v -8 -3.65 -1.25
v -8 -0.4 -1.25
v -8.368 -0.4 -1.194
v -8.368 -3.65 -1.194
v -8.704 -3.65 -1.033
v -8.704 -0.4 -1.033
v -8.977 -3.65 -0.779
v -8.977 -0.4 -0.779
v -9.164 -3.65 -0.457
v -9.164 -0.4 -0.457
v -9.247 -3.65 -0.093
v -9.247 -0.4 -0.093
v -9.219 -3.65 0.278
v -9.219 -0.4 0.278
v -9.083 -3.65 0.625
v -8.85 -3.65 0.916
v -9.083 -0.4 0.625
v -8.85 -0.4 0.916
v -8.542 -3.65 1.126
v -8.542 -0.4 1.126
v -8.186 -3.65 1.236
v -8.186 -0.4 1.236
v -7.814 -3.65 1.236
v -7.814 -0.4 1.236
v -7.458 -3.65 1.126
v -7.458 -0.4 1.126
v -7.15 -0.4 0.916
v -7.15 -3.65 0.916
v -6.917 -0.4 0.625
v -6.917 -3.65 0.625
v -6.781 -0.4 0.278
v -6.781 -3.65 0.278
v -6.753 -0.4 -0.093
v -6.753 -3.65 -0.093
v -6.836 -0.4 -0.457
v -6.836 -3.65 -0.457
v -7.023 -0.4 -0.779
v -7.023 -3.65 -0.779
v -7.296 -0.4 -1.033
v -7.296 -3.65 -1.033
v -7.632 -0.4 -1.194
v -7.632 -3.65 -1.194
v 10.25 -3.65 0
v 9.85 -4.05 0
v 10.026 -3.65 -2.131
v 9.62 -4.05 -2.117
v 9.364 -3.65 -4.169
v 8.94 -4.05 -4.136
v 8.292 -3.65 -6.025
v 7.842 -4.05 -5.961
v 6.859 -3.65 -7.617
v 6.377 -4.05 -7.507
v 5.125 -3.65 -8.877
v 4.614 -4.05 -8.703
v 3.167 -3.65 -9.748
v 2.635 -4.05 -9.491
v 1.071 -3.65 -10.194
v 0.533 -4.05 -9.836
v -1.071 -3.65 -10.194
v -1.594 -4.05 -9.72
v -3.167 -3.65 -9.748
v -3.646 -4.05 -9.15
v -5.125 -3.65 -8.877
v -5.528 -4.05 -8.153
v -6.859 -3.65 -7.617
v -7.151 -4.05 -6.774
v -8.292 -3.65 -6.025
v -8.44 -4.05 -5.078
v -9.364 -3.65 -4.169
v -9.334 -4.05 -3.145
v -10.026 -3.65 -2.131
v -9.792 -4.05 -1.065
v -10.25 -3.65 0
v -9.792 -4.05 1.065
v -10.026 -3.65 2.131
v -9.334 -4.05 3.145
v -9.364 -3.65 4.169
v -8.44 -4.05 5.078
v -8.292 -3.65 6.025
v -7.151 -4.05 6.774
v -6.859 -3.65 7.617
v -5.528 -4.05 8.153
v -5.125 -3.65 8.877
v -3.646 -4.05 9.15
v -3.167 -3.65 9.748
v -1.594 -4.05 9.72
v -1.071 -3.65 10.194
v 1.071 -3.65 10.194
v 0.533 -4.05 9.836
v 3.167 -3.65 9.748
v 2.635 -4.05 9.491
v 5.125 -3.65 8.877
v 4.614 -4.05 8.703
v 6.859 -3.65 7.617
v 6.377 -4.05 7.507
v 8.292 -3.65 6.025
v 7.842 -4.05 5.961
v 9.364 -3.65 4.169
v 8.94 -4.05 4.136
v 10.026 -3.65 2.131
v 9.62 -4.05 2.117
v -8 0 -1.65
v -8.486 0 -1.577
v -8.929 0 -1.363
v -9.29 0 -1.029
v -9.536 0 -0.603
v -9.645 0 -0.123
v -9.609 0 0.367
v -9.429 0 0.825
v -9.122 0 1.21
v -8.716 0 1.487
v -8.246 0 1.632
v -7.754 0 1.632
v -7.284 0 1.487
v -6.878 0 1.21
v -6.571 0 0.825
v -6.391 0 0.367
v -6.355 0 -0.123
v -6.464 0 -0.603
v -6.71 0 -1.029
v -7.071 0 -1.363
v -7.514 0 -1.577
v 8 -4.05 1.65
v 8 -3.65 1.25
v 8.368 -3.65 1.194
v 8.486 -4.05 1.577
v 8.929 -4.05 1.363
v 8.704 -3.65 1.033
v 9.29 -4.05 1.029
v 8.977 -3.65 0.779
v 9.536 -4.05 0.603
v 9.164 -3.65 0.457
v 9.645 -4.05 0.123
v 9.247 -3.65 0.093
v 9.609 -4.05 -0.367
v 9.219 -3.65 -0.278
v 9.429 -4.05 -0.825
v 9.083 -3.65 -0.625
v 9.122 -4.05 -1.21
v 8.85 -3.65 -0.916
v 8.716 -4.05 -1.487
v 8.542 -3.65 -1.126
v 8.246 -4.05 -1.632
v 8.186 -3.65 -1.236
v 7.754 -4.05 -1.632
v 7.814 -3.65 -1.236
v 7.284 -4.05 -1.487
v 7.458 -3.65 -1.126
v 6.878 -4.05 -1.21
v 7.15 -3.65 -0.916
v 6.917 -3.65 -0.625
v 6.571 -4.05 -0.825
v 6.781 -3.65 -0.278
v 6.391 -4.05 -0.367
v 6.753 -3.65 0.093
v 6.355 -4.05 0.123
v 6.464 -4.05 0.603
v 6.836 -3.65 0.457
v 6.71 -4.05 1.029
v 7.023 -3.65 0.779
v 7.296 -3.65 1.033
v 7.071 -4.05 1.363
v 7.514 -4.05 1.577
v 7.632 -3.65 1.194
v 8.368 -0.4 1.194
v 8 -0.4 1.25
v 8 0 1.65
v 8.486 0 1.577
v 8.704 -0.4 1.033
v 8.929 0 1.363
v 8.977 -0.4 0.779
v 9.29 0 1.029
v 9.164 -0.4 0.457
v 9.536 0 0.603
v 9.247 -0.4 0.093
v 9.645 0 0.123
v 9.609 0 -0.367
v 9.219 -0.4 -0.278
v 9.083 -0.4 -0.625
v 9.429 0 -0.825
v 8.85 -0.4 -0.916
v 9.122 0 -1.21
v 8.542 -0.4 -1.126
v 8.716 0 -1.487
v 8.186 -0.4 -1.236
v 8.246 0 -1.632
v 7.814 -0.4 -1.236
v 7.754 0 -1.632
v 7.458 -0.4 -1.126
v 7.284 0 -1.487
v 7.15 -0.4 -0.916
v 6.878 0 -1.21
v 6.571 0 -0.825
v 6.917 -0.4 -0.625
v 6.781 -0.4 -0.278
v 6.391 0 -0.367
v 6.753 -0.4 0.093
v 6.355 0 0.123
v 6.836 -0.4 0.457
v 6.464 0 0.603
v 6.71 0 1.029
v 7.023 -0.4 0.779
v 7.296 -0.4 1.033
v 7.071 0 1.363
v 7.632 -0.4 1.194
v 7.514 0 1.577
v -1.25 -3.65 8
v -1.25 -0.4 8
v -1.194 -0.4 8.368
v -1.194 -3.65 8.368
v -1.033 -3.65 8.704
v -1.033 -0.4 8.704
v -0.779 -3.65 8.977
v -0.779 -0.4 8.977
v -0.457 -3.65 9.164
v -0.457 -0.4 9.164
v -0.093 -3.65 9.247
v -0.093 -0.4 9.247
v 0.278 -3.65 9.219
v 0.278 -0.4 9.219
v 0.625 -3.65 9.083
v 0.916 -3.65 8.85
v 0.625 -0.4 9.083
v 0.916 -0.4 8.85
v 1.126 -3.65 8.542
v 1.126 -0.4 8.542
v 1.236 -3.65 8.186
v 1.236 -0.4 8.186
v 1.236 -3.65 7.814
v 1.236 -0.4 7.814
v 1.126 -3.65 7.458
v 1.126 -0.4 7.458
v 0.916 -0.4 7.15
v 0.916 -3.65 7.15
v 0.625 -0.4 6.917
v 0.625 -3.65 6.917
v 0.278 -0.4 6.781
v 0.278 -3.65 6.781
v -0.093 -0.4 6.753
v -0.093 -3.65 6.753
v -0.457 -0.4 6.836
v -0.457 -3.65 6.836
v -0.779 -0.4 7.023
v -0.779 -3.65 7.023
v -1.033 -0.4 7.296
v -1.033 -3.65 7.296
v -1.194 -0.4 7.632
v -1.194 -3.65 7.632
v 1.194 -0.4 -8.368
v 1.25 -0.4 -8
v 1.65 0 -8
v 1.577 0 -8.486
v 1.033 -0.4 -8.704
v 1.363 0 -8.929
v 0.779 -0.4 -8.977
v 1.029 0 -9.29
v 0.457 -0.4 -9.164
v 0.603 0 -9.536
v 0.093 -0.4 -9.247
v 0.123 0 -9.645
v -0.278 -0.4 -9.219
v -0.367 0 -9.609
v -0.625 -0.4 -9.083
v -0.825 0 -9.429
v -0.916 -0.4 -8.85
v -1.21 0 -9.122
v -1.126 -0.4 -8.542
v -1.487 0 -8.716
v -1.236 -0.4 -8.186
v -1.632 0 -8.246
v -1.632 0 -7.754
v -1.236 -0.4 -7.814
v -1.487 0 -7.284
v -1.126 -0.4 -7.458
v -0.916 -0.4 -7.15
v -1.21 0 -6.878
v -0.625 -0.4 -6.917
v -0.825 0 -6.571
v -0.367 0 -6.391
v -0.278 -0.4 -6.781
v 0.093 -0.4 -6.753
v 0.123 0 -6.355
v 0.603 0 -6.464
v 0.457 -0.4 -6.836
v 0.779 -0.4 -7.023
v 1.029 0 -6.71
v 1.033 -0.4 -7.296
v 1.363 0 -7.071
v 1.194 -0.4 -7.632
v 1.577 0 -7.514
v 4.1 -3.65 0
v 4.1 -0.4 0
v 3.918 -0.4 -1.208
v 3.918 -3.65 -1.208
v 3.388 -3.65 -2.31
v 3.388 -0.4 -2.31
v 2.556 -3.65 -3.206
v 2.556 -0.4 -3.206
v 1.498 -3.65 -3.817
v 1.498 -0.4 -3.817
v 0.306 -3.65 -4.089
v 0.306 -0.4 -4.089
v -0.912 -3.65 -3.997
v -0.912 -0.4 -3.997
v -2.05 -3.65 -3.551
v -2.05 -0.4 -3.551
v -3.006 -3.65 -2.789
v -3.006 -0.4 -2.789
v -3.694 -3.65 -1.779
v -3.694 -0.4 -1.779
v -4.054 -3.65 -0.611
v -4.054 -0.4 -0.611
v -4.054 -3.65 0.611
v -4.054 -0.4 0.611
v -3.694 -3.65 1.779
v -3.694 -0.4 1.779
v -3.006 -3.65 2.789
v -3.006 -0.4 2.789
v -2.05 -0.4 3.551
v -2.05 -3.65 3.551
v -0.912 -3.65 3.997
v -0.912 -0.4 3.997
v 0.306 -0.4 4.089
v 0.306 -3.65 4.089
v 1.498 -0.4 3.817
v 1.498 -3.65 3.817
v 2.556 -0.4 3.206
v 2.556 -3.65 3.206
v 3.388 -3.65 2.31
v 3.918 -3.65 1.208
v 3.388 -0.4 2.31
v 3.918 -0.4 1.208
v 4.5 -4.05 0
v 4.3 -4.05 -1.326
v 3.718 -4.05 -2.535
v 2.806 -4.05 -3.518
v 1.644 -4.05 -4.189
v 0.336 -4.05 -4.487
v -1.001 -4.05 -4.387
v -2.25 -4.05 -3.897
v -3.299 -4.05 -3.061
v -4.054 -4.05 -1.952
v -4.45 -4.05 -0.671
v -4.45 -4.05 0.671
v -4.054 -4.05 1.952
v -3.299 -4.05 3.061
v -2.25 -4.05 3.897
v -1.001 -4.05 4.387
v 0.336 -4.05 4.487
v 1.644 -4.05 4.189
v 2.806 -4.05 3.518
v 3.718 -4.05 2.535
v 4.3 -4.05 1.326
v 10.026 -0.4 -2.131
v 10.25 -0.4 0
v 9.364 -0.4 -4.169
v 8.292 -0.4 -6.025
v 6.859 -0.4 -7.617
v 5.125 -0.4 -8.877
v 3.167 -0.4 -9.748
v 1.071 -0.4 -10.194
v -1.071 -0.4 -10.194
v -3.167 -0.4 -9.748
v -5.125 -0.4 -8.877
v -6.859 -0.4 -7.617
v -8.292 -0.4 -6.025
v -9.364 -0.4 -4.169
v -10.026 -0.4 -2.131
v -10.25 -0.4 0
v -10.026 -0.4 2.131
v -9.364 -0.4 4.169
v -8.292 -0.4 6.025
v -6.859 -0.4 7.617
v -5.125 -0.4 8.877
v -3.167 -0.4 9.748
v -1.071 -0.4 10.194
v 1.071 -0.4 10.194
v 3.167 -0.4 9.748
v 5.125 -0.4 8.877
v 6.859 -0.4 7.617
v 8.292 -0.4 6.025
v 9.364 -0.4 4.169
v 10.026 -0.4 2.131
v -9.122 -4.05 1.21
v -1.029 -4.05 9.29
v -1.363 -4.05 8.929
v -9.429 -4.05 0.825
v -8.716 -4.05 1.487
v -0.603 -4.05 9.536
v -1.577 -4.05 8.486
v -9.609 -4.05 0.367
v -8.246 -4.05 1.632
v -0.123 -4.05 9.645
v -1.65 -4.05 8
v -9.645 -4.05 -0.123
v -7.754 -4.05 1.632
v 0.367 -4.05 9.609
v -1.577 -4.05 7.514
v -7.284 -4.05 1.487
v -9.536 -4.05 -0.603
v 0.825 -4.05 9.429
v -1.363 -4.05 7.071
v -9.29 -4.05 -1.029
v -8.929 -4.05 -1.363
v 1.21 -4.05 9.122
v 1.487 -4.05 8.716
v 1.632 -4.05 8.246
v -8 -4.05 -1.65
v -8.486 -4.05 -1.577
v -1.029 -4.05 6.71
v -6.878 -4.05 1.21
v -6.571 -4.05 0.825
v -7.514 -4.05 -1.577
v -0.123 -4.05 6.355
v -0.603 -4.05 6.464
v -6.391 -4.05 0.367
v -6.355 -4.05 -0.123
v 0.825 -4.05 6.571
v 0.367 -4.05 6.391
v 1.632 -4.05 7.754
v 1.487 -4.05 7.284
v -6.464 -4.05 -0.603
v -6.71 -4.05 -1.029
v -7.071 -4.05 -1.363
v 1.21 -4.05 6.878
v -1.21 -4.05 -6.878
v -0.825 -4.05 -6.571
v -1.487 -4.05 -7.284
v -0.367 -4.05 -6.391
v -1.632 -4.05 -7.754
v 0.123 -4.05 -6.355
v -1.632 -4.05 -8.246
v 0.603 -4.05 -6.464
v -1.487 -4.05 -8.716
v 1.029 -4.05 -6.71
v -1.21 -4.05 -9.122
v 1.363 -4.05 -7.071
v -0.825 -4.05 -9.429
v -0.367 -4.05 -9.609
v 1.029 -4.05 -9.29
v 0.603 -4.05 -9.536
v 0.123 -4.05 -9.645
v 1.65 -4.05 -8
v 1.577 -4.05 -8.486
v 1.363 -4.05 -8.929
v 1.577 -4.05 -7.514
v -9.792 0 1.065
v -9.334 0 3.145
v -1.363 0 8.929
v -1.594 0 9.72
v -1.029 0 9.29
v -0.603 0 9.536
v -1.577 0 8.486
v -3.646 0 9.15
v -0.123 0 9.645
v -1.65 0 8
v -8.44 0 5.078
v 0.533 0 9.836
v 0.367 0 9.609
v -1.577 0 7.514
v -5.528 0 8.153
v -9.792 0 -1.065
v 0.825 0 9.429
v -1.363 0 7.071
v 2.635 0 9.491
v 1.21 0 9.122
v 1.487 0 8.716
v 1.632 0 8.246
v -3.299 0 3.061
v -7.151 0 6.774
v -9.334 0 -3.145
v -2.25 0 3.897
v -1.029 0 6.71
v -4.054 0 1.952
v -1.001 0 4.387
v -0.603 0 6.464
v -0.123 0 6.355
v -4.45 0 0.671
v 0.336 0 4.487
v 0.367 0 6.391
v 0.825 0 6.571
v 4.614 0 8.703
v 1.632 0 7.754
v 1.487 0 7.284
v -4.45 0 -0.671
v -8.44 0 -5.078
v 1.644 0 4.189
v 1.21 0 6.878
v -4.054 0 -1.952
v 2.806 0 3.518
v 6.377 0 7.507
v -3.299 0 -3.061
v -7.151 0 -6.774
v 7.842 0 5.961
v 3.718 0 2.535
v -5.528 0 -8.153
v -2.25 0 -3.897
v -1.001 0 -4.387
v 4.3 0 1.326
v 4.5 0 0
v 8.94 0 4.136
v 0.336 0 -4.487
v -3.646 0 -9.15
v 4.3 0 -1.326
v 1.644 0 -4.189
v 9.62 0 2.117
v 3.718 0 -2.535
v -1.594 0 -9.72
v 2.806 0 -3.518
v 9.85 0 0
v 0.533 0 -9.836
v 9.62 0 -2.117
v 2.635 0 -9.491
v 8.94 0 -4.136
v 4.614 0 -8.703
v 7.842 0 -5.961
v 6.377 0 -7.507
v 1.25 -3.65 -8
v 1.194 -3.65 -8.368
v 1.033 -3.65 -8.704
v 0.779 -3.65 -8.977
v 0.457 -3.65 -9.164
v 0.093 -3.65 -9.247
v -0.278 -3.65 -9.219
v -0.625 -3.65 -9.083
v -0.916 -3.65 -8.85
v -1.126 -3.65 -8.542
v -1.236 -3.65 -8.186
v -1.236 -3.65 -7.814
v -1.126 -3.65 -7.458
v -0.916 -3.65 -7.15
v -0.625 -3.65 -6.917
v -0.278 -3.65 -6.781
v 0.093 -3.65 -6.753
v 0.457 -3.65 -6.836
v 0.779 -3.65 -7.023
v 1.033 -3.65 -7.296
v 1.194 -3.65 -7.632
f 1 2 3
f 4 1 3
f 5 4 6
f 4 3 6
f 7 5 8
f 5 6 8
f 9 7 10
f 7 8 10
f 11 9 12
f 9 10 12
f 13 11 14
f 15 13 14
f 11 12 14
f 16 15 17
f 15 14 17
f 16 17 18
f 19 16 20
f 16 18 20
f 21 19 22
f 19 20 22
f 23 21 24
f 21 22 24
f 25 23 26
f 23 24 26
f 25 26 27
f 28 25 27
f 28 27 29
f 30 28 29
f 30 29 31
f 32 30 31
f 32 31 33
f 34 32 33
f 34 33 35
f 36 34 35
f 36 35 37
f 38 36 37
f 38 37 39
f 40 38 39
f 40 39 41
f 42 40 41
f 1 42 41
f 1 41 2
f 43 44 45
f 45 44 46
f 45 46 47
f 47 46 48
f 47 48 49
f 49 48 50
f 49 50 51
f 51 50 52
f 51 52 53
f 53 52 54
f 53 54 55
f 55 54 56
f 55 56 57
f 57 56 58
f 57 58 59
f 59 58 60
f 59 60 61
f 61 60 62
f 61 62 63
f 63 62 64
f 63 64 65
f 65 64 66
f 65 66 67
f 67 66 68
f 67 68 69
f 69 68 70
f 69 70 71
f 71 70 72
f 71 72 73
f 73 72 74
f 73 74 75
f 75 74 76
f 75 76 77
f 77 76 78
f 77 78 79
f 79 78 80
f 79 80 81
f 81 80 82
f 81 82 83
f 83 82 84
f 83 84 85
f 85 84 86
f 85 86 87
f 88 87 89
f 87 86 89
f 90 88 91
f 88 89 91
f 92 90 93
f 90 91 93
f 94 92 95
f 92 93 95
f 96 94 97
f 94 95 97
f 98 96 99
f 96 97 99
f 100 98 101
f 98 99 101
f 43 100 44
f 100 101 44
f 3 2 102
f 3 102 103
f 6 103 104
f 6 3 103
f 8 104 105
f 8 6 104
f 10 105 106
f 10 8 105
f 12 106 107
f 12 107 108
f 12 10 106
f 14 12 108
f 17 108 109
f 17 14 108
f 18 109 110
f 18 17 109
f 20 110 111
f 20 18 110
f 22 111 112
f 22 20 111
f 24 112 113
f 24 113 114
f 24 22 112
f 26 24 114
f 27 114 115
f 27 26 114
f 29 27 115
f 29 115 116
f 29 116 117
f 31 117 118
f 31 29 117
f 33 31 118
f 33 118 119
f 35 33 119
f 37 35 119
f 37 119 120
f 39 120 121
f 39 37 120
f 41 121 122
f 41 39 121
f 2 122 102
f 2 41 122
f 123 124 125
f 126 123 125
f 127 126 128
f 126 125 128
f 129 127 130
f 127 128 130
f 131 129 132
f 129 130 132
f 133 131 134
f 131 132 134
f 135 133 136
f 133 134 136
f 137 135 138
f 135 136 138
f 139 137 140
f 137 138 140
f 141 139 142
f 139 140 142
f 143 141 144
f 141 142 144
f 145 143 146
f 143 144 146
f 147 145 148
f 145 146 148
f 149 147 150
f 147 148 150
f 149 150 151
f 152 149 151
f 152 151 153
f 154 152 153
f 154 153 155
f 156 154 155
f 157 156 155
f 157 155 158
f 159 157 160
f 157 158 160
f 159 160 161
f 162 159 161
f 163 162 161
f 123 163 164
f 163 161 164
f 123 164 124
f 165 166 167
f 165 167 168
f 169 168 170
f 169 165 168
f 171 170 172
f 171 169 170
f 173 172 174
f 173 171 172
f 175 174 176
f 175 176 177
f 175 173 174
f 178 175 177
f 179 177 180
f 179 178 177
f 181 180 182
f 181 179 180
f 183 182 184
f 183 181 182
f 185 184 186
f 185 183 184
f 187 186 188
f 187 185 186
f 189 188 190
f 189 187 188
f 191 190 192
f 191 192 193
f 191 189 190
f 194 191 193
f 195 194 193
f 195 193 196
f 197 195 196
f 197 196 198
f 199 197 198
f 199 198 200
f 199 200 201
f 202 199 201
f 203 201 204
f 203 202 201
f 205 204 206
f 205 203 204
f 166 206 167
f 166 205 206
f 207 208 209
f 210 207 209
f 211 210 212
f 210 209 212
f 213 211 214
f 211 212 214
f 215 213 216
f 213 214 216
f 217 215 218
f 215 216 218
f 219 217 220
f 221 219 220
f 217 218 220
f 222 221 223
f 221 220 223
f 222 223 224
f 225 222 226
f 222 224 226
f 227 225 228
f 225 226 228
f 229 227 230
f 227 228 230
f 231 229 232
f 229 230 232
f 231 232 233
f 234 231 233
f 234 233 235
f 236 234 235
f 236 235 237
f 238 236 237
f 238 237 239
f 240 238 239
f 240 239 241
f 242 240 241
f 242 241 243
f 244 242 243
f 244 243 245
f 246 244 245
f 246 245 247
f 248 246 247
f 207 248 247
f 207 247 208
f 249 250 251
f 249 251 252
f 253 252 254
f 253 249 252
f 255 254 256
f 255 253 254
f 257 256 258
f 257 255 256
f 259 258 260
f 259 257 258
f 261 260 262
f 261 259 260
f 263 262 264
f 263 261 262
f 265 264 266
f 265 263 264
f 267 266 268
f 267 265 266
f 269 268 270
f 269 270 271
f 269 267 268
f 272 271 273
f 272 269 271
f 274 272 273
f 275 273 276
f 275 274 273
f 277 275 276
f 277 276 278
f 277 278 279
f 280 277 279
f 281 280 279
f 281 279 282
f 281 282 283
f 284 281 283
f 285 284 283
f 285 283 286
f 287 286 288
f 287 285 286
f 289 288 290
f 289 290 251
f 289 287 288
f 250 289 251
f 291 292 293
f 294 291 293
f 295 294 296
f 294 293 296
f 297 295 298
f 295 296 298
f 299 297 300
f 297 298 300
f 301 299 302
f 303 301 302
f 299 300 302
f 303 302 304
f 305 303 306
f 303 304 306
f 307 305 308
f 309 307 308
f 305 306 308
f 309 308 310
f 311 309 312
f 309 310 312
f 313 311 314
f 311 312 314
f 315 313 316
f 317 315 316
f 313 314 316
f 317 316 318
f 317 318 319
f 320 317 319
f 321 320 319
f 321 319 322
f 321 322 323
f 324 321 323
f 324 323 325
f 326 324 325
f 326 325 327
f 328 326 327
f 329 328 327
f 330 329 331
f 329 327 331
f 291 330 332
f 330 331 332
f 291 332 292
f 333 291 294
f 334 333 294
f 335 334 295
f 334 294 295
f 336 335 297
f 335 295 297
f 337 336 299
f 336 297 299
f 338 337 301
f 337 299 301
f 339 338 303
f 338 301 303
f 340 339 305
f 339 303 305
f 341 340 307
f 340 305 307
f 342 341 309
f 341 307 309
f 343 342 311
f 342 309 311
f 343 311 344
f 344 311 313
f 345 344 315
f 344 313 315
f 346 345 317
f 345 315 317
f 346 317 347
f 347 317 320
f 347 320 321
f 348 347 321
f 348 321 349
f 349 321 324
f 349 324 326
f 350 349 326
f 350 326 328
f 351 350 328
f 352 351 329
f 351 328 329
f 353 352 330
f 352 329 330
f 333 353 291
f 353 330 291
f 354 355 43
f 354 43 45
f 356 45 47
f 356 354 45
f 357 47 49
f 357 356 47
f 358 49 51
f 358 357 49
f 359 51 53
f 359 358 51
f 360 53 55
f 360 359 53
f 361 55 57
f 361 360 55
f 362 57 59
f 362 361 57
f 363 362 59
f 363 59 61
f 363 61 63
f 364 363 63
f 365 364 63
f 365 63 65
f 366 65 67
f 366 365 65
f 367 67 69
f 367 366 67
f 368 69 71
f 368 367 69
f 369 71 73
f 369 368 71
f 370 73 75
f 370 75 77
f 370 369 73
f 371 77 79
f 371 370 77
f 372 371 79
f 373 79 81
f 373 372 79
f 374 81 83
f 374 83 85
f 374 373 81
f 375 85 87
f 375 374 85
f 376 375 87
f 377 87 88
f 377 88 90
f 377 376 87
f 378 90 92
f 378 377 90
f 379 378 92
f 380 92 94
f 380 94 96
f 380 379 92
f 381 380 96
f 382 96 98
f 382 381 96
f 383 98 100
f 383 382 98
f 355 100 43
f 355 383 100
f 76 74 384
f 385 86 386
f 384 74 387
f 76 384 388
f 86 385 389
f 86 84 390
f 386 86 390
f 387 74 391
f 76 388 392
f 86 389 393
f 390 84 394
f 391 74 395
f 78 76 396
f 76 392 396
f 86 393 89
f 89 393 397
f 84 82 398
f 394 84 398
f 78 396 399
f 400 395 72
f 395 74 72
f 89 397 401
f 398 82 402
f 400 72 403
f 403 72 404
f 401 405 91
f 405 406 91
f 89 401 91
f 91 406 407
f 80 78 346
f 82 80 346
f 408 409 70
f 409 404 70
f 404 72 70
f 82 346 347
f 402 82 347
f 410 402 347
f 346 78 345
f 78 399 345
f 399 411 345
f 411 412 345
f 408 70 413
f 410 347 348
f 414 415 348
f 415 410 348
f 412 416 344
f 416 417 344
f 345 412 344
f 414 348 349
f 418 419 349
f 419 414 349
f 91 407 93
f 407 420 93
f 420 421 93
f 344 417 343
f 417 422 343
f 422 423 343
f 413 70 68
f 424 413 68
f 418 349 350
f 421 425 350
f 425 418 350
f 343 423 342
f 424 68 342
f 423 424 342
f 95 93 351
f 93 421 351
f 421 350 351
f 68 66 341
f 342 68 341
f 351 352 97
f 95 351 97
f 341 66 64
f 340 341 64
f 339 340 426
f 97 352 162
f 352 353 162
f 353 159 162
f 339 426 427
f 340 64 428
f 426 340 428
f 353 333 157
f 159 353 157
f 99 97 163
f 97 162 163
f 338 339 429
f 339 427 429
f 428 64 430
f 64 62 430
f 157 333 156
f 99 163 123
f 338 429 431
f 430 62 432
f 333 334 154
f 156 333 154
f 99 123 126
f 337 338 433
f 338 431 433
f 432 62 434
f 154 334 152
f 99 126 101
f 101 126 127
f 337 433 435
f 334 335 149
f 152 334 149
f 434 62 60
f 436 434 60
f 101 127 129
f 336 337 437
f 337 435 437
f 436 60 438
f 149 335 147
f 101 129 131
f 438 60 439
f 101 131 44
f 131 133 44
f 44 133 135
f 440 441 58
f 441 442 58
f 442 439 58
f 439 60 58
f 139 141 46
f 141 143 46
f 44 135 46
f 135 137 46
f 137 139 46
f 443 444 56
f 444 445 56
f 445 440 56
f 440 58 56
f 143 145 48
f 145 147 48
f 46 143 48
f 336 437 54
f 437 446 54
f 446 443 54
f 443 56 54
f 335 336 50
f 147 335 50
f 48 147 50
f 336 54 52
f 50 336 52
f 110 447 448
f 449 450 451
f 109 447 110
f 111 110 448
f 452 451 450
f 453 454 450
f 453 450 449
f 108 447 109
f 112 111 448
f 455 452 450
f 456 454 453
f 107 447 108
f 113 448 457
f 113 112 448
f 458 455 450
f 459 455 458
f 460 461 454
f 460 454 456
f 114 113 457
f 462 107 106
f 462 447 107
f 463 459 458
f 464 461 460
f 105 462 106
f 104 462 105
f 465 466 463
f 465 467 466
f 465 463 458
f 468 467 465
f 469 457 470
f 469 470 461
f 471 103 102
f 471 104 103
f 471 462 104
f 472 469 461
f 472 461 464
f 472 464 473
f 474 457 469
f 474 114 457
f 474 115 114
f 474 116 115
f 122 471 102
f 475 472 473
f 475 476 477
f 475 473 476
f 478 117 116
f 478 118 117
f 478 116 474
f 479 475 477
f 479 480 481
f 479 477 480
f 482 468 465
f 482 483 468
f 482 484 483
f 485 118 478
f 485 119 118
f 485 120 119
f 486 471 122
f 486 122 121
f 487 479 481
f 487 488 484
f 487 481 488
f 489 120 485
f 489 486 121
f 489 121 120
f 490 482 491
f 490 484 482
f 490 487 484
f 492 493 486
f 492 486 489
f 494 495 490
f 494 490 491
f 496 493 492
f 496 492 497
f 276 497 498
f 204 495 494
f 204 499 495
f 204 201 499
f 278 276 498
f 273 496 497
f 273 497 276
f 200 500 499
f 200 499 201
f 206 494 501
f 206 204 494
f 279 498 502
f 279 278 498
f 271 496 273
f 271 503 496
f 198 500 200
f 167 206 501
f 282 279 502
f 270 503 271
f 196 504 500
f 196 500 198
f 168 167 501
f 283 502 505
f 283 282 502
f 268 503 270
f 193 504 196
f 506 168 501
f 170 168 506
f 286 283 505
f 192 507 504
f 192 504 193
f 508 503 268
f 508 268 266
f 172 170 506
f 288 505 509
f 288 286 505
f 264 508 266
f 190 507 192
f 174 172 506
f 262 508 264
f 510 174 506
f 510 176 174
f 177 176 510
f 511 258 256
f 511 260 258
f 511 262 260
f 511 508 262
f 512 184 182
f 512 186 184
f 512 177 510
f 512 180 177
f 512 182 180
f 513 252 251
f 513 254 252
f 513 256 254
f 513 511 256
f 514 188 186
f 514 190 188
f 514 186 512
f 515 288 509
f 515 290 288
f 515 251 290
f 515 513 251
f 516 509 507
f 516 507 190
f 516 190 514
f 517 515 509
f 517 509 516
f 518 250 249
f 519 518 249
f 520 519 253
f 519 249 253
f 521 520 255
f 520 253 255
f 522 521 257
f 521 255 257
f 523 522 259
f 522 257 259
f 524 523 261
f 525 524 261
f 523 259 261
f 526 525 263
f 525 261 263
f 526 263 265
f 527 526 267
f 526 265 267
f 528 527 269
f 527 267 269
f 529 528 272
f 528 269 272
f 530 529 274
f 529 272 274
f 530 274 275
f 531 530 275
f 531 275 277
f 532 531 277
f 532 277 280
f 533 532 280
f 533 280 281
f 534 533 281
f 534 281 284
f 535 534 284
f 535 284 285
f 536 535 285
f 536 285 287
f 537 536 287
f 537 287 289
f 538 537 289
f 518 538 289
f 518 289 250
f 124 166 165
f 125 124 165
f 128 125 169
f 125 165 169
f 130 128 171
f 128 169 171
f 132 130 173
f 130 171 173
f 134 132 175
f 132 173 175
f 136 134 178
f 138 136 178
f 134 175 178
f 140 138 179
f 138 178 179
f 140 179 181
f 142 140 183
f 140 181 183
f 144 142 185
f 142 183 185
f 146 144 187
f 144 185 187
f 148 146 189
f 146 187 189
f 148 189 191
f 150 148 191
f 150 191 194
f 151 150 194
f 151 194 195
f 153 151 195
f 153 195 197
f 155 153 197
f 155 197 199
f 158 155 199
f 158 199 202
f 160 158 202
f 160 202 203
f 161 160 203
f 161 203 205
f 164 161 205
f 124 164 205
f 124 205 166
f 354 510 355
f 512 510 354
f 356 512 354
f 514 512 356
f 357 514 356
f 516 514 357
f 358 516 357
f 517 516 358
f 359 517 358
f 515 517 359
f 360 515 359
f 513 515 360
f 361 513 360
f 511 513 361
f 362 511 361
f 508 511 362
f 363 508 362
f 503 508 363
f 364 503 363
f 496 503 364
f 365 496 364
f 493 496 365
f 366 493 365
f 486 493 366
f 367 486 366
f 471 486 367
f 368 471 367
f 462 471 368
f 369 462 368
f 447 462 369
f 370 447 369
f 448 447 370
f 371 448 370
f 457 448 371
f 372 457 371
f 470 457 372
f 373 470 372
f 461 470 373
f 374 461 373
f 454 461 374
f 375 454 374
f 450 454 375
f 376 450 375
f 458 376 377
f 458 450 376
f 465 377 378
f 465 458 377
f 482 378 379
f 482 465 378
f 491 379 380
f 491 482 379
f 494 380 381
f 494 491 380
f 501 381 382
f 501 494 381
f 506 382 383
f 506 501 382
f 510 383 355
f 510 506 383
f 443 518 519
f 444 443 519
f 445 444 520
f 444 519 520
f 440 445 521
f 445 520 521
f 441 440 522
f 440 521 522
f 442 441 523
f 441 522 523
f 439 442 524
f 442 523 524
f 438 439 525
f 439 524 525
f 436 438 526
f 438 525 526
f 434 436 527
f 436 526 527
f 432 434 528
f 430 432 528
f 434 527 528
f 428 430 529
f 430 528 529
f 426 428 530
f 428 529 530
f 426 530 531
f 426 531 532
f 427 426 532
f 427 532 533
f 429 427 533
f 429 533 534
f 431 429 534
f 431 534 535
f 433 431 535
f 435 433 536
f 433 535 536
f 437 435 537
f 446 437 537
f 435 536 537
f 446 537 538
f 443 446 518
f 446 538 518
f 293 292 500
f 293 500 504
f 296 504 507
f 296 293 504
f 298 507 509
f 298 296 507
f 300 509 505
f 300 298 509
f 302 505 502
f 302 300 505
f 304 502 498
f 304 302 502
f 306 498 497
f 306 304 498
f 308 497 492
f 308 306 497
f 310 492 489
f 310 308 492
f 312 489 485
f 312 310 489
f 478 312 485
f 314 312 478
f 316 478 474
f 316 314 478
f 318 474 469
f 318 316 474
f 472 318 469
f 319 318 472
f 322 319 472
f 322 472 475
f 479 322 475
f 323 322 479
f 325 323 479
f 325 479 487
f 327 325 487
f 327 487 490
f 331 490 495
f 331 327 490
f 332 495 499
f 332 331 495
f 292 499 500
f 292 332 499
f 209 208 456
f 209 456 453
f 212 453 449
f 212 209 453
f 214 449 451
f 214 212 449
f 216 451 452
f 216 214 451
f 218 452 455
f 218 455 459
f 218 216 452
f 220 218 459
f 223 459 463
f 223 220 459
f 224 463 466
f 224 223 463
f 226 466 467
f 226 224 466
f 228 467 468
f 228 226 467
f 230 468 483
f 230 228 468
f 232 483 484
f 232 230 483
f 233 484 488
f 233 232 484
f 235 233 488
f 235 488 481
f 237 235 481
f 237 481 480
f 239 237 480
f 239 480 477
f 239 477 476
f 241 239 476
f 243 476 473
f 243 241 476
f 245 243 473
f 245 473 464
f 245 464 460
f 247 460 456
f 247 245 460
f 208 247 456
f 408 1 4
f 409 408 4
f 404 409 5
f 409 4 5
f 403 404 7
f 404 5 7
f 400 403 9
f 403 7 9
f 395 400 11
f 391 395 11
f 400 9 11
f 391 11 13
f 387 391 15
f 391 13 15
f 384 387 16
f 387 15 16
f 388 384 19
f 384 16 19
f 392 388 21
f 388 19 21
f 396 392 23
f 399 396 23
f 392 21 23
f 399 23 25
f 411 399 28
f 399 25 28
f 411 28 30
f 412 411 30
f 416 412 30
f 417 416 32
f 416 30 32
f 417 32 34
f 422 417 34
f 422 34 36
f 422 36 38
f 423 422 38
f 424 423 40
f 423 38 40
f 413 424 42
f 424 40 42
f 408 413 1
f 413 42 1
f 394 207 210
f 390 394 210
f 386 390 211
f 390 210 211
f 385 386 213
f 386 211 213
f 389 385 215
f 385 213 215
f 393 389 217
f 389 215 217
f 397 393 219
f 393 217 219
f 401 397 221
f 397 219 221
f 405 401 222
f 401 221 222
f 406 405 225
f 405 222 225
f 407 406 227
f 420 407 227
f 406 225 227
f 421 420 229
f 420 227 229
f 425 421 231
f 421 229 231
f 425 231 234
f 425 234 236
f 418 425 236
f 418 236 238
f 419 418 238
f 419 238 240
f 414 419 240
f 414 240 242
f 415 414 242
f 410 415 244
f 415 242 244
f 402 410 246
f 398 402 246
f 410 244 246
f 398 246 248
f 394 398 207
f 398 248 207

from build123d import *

# Parameters (mm, degrees)
SKETCH1_R           = 10.25
SKETCH1_R_2         = 4.1
BOSS_EXTRUDE1_DEPTH = 4.05
SKETCH4_R           = 1.25
CUT_EXTRUDE1_DEPTH  = 5.05
CIRPATTERN1_COUNT   = 4
CHAMFER1_SIZE       = 0.4


with BuildPart() as part:
    # Sketch1 → Boss-Extrude1 (new body)
    with BuildSketch(Plane(origin=(0, 0, 0), x_dir=(1, 0, 0), z_dir=(0, 1, 0))):
        Circle(SKETCH1_R)
        Circle(SKETCH1_R_2, mode=Mode.SUBTRACT)
    extrude(amount=-BOSS_EXTRUDE1_DEPTH)

    # Sketch4 → Cut-Extrude1 (cut, through all)
    with BuildSketch(Plane(origin=(0, 0, 0), x_dir=(1, 0, 0), z_dir=(0, 1, 0))):
        with Locations((0, 8)):
            Circle(SKETCH4_R)
    cut_extrude1 = extrude(amount=-CUT_EXTRUDE1_DEPTH, mode=Mode.SUBTRACT)

    # CirPattern1: Cut-Extrude1 ×4 about axis
    cirpattern1_axis = Axis((0, 0, 0), (0, 1, 0))
    for i in range(1, CIRPATTERN1_COUNT):
        add(cut_extrude1.rotate(cirpattern1_axis, i * 360 / CIRPATTERN1_COUNT), mode=Mode.SUBTRACT)

    # Chamfer1
    chamfer1_edges = [part.edges().sort_by_distance(p)[0] for p in [
        (-1.25, -4.05, -8),
        (-1.25, 0, -8),
        (-10.25, 0, 0),
        (-8, -4.05, 1.25),
        (-8, 0, 1.25),
        (1.25, -4.05, 8),
        (1.25, 0, 8),
        (8, -4.05, -1.25),
        (8, 0, -1.25),
        (-10.25, -4.05, 0),
        (-4.1, -4.05, 0),
        (-4.1, 0, 0),
    ]]
    chamfer(chamfer1_edges, length=CHAMFER1_SIZE)


solid = part.part
